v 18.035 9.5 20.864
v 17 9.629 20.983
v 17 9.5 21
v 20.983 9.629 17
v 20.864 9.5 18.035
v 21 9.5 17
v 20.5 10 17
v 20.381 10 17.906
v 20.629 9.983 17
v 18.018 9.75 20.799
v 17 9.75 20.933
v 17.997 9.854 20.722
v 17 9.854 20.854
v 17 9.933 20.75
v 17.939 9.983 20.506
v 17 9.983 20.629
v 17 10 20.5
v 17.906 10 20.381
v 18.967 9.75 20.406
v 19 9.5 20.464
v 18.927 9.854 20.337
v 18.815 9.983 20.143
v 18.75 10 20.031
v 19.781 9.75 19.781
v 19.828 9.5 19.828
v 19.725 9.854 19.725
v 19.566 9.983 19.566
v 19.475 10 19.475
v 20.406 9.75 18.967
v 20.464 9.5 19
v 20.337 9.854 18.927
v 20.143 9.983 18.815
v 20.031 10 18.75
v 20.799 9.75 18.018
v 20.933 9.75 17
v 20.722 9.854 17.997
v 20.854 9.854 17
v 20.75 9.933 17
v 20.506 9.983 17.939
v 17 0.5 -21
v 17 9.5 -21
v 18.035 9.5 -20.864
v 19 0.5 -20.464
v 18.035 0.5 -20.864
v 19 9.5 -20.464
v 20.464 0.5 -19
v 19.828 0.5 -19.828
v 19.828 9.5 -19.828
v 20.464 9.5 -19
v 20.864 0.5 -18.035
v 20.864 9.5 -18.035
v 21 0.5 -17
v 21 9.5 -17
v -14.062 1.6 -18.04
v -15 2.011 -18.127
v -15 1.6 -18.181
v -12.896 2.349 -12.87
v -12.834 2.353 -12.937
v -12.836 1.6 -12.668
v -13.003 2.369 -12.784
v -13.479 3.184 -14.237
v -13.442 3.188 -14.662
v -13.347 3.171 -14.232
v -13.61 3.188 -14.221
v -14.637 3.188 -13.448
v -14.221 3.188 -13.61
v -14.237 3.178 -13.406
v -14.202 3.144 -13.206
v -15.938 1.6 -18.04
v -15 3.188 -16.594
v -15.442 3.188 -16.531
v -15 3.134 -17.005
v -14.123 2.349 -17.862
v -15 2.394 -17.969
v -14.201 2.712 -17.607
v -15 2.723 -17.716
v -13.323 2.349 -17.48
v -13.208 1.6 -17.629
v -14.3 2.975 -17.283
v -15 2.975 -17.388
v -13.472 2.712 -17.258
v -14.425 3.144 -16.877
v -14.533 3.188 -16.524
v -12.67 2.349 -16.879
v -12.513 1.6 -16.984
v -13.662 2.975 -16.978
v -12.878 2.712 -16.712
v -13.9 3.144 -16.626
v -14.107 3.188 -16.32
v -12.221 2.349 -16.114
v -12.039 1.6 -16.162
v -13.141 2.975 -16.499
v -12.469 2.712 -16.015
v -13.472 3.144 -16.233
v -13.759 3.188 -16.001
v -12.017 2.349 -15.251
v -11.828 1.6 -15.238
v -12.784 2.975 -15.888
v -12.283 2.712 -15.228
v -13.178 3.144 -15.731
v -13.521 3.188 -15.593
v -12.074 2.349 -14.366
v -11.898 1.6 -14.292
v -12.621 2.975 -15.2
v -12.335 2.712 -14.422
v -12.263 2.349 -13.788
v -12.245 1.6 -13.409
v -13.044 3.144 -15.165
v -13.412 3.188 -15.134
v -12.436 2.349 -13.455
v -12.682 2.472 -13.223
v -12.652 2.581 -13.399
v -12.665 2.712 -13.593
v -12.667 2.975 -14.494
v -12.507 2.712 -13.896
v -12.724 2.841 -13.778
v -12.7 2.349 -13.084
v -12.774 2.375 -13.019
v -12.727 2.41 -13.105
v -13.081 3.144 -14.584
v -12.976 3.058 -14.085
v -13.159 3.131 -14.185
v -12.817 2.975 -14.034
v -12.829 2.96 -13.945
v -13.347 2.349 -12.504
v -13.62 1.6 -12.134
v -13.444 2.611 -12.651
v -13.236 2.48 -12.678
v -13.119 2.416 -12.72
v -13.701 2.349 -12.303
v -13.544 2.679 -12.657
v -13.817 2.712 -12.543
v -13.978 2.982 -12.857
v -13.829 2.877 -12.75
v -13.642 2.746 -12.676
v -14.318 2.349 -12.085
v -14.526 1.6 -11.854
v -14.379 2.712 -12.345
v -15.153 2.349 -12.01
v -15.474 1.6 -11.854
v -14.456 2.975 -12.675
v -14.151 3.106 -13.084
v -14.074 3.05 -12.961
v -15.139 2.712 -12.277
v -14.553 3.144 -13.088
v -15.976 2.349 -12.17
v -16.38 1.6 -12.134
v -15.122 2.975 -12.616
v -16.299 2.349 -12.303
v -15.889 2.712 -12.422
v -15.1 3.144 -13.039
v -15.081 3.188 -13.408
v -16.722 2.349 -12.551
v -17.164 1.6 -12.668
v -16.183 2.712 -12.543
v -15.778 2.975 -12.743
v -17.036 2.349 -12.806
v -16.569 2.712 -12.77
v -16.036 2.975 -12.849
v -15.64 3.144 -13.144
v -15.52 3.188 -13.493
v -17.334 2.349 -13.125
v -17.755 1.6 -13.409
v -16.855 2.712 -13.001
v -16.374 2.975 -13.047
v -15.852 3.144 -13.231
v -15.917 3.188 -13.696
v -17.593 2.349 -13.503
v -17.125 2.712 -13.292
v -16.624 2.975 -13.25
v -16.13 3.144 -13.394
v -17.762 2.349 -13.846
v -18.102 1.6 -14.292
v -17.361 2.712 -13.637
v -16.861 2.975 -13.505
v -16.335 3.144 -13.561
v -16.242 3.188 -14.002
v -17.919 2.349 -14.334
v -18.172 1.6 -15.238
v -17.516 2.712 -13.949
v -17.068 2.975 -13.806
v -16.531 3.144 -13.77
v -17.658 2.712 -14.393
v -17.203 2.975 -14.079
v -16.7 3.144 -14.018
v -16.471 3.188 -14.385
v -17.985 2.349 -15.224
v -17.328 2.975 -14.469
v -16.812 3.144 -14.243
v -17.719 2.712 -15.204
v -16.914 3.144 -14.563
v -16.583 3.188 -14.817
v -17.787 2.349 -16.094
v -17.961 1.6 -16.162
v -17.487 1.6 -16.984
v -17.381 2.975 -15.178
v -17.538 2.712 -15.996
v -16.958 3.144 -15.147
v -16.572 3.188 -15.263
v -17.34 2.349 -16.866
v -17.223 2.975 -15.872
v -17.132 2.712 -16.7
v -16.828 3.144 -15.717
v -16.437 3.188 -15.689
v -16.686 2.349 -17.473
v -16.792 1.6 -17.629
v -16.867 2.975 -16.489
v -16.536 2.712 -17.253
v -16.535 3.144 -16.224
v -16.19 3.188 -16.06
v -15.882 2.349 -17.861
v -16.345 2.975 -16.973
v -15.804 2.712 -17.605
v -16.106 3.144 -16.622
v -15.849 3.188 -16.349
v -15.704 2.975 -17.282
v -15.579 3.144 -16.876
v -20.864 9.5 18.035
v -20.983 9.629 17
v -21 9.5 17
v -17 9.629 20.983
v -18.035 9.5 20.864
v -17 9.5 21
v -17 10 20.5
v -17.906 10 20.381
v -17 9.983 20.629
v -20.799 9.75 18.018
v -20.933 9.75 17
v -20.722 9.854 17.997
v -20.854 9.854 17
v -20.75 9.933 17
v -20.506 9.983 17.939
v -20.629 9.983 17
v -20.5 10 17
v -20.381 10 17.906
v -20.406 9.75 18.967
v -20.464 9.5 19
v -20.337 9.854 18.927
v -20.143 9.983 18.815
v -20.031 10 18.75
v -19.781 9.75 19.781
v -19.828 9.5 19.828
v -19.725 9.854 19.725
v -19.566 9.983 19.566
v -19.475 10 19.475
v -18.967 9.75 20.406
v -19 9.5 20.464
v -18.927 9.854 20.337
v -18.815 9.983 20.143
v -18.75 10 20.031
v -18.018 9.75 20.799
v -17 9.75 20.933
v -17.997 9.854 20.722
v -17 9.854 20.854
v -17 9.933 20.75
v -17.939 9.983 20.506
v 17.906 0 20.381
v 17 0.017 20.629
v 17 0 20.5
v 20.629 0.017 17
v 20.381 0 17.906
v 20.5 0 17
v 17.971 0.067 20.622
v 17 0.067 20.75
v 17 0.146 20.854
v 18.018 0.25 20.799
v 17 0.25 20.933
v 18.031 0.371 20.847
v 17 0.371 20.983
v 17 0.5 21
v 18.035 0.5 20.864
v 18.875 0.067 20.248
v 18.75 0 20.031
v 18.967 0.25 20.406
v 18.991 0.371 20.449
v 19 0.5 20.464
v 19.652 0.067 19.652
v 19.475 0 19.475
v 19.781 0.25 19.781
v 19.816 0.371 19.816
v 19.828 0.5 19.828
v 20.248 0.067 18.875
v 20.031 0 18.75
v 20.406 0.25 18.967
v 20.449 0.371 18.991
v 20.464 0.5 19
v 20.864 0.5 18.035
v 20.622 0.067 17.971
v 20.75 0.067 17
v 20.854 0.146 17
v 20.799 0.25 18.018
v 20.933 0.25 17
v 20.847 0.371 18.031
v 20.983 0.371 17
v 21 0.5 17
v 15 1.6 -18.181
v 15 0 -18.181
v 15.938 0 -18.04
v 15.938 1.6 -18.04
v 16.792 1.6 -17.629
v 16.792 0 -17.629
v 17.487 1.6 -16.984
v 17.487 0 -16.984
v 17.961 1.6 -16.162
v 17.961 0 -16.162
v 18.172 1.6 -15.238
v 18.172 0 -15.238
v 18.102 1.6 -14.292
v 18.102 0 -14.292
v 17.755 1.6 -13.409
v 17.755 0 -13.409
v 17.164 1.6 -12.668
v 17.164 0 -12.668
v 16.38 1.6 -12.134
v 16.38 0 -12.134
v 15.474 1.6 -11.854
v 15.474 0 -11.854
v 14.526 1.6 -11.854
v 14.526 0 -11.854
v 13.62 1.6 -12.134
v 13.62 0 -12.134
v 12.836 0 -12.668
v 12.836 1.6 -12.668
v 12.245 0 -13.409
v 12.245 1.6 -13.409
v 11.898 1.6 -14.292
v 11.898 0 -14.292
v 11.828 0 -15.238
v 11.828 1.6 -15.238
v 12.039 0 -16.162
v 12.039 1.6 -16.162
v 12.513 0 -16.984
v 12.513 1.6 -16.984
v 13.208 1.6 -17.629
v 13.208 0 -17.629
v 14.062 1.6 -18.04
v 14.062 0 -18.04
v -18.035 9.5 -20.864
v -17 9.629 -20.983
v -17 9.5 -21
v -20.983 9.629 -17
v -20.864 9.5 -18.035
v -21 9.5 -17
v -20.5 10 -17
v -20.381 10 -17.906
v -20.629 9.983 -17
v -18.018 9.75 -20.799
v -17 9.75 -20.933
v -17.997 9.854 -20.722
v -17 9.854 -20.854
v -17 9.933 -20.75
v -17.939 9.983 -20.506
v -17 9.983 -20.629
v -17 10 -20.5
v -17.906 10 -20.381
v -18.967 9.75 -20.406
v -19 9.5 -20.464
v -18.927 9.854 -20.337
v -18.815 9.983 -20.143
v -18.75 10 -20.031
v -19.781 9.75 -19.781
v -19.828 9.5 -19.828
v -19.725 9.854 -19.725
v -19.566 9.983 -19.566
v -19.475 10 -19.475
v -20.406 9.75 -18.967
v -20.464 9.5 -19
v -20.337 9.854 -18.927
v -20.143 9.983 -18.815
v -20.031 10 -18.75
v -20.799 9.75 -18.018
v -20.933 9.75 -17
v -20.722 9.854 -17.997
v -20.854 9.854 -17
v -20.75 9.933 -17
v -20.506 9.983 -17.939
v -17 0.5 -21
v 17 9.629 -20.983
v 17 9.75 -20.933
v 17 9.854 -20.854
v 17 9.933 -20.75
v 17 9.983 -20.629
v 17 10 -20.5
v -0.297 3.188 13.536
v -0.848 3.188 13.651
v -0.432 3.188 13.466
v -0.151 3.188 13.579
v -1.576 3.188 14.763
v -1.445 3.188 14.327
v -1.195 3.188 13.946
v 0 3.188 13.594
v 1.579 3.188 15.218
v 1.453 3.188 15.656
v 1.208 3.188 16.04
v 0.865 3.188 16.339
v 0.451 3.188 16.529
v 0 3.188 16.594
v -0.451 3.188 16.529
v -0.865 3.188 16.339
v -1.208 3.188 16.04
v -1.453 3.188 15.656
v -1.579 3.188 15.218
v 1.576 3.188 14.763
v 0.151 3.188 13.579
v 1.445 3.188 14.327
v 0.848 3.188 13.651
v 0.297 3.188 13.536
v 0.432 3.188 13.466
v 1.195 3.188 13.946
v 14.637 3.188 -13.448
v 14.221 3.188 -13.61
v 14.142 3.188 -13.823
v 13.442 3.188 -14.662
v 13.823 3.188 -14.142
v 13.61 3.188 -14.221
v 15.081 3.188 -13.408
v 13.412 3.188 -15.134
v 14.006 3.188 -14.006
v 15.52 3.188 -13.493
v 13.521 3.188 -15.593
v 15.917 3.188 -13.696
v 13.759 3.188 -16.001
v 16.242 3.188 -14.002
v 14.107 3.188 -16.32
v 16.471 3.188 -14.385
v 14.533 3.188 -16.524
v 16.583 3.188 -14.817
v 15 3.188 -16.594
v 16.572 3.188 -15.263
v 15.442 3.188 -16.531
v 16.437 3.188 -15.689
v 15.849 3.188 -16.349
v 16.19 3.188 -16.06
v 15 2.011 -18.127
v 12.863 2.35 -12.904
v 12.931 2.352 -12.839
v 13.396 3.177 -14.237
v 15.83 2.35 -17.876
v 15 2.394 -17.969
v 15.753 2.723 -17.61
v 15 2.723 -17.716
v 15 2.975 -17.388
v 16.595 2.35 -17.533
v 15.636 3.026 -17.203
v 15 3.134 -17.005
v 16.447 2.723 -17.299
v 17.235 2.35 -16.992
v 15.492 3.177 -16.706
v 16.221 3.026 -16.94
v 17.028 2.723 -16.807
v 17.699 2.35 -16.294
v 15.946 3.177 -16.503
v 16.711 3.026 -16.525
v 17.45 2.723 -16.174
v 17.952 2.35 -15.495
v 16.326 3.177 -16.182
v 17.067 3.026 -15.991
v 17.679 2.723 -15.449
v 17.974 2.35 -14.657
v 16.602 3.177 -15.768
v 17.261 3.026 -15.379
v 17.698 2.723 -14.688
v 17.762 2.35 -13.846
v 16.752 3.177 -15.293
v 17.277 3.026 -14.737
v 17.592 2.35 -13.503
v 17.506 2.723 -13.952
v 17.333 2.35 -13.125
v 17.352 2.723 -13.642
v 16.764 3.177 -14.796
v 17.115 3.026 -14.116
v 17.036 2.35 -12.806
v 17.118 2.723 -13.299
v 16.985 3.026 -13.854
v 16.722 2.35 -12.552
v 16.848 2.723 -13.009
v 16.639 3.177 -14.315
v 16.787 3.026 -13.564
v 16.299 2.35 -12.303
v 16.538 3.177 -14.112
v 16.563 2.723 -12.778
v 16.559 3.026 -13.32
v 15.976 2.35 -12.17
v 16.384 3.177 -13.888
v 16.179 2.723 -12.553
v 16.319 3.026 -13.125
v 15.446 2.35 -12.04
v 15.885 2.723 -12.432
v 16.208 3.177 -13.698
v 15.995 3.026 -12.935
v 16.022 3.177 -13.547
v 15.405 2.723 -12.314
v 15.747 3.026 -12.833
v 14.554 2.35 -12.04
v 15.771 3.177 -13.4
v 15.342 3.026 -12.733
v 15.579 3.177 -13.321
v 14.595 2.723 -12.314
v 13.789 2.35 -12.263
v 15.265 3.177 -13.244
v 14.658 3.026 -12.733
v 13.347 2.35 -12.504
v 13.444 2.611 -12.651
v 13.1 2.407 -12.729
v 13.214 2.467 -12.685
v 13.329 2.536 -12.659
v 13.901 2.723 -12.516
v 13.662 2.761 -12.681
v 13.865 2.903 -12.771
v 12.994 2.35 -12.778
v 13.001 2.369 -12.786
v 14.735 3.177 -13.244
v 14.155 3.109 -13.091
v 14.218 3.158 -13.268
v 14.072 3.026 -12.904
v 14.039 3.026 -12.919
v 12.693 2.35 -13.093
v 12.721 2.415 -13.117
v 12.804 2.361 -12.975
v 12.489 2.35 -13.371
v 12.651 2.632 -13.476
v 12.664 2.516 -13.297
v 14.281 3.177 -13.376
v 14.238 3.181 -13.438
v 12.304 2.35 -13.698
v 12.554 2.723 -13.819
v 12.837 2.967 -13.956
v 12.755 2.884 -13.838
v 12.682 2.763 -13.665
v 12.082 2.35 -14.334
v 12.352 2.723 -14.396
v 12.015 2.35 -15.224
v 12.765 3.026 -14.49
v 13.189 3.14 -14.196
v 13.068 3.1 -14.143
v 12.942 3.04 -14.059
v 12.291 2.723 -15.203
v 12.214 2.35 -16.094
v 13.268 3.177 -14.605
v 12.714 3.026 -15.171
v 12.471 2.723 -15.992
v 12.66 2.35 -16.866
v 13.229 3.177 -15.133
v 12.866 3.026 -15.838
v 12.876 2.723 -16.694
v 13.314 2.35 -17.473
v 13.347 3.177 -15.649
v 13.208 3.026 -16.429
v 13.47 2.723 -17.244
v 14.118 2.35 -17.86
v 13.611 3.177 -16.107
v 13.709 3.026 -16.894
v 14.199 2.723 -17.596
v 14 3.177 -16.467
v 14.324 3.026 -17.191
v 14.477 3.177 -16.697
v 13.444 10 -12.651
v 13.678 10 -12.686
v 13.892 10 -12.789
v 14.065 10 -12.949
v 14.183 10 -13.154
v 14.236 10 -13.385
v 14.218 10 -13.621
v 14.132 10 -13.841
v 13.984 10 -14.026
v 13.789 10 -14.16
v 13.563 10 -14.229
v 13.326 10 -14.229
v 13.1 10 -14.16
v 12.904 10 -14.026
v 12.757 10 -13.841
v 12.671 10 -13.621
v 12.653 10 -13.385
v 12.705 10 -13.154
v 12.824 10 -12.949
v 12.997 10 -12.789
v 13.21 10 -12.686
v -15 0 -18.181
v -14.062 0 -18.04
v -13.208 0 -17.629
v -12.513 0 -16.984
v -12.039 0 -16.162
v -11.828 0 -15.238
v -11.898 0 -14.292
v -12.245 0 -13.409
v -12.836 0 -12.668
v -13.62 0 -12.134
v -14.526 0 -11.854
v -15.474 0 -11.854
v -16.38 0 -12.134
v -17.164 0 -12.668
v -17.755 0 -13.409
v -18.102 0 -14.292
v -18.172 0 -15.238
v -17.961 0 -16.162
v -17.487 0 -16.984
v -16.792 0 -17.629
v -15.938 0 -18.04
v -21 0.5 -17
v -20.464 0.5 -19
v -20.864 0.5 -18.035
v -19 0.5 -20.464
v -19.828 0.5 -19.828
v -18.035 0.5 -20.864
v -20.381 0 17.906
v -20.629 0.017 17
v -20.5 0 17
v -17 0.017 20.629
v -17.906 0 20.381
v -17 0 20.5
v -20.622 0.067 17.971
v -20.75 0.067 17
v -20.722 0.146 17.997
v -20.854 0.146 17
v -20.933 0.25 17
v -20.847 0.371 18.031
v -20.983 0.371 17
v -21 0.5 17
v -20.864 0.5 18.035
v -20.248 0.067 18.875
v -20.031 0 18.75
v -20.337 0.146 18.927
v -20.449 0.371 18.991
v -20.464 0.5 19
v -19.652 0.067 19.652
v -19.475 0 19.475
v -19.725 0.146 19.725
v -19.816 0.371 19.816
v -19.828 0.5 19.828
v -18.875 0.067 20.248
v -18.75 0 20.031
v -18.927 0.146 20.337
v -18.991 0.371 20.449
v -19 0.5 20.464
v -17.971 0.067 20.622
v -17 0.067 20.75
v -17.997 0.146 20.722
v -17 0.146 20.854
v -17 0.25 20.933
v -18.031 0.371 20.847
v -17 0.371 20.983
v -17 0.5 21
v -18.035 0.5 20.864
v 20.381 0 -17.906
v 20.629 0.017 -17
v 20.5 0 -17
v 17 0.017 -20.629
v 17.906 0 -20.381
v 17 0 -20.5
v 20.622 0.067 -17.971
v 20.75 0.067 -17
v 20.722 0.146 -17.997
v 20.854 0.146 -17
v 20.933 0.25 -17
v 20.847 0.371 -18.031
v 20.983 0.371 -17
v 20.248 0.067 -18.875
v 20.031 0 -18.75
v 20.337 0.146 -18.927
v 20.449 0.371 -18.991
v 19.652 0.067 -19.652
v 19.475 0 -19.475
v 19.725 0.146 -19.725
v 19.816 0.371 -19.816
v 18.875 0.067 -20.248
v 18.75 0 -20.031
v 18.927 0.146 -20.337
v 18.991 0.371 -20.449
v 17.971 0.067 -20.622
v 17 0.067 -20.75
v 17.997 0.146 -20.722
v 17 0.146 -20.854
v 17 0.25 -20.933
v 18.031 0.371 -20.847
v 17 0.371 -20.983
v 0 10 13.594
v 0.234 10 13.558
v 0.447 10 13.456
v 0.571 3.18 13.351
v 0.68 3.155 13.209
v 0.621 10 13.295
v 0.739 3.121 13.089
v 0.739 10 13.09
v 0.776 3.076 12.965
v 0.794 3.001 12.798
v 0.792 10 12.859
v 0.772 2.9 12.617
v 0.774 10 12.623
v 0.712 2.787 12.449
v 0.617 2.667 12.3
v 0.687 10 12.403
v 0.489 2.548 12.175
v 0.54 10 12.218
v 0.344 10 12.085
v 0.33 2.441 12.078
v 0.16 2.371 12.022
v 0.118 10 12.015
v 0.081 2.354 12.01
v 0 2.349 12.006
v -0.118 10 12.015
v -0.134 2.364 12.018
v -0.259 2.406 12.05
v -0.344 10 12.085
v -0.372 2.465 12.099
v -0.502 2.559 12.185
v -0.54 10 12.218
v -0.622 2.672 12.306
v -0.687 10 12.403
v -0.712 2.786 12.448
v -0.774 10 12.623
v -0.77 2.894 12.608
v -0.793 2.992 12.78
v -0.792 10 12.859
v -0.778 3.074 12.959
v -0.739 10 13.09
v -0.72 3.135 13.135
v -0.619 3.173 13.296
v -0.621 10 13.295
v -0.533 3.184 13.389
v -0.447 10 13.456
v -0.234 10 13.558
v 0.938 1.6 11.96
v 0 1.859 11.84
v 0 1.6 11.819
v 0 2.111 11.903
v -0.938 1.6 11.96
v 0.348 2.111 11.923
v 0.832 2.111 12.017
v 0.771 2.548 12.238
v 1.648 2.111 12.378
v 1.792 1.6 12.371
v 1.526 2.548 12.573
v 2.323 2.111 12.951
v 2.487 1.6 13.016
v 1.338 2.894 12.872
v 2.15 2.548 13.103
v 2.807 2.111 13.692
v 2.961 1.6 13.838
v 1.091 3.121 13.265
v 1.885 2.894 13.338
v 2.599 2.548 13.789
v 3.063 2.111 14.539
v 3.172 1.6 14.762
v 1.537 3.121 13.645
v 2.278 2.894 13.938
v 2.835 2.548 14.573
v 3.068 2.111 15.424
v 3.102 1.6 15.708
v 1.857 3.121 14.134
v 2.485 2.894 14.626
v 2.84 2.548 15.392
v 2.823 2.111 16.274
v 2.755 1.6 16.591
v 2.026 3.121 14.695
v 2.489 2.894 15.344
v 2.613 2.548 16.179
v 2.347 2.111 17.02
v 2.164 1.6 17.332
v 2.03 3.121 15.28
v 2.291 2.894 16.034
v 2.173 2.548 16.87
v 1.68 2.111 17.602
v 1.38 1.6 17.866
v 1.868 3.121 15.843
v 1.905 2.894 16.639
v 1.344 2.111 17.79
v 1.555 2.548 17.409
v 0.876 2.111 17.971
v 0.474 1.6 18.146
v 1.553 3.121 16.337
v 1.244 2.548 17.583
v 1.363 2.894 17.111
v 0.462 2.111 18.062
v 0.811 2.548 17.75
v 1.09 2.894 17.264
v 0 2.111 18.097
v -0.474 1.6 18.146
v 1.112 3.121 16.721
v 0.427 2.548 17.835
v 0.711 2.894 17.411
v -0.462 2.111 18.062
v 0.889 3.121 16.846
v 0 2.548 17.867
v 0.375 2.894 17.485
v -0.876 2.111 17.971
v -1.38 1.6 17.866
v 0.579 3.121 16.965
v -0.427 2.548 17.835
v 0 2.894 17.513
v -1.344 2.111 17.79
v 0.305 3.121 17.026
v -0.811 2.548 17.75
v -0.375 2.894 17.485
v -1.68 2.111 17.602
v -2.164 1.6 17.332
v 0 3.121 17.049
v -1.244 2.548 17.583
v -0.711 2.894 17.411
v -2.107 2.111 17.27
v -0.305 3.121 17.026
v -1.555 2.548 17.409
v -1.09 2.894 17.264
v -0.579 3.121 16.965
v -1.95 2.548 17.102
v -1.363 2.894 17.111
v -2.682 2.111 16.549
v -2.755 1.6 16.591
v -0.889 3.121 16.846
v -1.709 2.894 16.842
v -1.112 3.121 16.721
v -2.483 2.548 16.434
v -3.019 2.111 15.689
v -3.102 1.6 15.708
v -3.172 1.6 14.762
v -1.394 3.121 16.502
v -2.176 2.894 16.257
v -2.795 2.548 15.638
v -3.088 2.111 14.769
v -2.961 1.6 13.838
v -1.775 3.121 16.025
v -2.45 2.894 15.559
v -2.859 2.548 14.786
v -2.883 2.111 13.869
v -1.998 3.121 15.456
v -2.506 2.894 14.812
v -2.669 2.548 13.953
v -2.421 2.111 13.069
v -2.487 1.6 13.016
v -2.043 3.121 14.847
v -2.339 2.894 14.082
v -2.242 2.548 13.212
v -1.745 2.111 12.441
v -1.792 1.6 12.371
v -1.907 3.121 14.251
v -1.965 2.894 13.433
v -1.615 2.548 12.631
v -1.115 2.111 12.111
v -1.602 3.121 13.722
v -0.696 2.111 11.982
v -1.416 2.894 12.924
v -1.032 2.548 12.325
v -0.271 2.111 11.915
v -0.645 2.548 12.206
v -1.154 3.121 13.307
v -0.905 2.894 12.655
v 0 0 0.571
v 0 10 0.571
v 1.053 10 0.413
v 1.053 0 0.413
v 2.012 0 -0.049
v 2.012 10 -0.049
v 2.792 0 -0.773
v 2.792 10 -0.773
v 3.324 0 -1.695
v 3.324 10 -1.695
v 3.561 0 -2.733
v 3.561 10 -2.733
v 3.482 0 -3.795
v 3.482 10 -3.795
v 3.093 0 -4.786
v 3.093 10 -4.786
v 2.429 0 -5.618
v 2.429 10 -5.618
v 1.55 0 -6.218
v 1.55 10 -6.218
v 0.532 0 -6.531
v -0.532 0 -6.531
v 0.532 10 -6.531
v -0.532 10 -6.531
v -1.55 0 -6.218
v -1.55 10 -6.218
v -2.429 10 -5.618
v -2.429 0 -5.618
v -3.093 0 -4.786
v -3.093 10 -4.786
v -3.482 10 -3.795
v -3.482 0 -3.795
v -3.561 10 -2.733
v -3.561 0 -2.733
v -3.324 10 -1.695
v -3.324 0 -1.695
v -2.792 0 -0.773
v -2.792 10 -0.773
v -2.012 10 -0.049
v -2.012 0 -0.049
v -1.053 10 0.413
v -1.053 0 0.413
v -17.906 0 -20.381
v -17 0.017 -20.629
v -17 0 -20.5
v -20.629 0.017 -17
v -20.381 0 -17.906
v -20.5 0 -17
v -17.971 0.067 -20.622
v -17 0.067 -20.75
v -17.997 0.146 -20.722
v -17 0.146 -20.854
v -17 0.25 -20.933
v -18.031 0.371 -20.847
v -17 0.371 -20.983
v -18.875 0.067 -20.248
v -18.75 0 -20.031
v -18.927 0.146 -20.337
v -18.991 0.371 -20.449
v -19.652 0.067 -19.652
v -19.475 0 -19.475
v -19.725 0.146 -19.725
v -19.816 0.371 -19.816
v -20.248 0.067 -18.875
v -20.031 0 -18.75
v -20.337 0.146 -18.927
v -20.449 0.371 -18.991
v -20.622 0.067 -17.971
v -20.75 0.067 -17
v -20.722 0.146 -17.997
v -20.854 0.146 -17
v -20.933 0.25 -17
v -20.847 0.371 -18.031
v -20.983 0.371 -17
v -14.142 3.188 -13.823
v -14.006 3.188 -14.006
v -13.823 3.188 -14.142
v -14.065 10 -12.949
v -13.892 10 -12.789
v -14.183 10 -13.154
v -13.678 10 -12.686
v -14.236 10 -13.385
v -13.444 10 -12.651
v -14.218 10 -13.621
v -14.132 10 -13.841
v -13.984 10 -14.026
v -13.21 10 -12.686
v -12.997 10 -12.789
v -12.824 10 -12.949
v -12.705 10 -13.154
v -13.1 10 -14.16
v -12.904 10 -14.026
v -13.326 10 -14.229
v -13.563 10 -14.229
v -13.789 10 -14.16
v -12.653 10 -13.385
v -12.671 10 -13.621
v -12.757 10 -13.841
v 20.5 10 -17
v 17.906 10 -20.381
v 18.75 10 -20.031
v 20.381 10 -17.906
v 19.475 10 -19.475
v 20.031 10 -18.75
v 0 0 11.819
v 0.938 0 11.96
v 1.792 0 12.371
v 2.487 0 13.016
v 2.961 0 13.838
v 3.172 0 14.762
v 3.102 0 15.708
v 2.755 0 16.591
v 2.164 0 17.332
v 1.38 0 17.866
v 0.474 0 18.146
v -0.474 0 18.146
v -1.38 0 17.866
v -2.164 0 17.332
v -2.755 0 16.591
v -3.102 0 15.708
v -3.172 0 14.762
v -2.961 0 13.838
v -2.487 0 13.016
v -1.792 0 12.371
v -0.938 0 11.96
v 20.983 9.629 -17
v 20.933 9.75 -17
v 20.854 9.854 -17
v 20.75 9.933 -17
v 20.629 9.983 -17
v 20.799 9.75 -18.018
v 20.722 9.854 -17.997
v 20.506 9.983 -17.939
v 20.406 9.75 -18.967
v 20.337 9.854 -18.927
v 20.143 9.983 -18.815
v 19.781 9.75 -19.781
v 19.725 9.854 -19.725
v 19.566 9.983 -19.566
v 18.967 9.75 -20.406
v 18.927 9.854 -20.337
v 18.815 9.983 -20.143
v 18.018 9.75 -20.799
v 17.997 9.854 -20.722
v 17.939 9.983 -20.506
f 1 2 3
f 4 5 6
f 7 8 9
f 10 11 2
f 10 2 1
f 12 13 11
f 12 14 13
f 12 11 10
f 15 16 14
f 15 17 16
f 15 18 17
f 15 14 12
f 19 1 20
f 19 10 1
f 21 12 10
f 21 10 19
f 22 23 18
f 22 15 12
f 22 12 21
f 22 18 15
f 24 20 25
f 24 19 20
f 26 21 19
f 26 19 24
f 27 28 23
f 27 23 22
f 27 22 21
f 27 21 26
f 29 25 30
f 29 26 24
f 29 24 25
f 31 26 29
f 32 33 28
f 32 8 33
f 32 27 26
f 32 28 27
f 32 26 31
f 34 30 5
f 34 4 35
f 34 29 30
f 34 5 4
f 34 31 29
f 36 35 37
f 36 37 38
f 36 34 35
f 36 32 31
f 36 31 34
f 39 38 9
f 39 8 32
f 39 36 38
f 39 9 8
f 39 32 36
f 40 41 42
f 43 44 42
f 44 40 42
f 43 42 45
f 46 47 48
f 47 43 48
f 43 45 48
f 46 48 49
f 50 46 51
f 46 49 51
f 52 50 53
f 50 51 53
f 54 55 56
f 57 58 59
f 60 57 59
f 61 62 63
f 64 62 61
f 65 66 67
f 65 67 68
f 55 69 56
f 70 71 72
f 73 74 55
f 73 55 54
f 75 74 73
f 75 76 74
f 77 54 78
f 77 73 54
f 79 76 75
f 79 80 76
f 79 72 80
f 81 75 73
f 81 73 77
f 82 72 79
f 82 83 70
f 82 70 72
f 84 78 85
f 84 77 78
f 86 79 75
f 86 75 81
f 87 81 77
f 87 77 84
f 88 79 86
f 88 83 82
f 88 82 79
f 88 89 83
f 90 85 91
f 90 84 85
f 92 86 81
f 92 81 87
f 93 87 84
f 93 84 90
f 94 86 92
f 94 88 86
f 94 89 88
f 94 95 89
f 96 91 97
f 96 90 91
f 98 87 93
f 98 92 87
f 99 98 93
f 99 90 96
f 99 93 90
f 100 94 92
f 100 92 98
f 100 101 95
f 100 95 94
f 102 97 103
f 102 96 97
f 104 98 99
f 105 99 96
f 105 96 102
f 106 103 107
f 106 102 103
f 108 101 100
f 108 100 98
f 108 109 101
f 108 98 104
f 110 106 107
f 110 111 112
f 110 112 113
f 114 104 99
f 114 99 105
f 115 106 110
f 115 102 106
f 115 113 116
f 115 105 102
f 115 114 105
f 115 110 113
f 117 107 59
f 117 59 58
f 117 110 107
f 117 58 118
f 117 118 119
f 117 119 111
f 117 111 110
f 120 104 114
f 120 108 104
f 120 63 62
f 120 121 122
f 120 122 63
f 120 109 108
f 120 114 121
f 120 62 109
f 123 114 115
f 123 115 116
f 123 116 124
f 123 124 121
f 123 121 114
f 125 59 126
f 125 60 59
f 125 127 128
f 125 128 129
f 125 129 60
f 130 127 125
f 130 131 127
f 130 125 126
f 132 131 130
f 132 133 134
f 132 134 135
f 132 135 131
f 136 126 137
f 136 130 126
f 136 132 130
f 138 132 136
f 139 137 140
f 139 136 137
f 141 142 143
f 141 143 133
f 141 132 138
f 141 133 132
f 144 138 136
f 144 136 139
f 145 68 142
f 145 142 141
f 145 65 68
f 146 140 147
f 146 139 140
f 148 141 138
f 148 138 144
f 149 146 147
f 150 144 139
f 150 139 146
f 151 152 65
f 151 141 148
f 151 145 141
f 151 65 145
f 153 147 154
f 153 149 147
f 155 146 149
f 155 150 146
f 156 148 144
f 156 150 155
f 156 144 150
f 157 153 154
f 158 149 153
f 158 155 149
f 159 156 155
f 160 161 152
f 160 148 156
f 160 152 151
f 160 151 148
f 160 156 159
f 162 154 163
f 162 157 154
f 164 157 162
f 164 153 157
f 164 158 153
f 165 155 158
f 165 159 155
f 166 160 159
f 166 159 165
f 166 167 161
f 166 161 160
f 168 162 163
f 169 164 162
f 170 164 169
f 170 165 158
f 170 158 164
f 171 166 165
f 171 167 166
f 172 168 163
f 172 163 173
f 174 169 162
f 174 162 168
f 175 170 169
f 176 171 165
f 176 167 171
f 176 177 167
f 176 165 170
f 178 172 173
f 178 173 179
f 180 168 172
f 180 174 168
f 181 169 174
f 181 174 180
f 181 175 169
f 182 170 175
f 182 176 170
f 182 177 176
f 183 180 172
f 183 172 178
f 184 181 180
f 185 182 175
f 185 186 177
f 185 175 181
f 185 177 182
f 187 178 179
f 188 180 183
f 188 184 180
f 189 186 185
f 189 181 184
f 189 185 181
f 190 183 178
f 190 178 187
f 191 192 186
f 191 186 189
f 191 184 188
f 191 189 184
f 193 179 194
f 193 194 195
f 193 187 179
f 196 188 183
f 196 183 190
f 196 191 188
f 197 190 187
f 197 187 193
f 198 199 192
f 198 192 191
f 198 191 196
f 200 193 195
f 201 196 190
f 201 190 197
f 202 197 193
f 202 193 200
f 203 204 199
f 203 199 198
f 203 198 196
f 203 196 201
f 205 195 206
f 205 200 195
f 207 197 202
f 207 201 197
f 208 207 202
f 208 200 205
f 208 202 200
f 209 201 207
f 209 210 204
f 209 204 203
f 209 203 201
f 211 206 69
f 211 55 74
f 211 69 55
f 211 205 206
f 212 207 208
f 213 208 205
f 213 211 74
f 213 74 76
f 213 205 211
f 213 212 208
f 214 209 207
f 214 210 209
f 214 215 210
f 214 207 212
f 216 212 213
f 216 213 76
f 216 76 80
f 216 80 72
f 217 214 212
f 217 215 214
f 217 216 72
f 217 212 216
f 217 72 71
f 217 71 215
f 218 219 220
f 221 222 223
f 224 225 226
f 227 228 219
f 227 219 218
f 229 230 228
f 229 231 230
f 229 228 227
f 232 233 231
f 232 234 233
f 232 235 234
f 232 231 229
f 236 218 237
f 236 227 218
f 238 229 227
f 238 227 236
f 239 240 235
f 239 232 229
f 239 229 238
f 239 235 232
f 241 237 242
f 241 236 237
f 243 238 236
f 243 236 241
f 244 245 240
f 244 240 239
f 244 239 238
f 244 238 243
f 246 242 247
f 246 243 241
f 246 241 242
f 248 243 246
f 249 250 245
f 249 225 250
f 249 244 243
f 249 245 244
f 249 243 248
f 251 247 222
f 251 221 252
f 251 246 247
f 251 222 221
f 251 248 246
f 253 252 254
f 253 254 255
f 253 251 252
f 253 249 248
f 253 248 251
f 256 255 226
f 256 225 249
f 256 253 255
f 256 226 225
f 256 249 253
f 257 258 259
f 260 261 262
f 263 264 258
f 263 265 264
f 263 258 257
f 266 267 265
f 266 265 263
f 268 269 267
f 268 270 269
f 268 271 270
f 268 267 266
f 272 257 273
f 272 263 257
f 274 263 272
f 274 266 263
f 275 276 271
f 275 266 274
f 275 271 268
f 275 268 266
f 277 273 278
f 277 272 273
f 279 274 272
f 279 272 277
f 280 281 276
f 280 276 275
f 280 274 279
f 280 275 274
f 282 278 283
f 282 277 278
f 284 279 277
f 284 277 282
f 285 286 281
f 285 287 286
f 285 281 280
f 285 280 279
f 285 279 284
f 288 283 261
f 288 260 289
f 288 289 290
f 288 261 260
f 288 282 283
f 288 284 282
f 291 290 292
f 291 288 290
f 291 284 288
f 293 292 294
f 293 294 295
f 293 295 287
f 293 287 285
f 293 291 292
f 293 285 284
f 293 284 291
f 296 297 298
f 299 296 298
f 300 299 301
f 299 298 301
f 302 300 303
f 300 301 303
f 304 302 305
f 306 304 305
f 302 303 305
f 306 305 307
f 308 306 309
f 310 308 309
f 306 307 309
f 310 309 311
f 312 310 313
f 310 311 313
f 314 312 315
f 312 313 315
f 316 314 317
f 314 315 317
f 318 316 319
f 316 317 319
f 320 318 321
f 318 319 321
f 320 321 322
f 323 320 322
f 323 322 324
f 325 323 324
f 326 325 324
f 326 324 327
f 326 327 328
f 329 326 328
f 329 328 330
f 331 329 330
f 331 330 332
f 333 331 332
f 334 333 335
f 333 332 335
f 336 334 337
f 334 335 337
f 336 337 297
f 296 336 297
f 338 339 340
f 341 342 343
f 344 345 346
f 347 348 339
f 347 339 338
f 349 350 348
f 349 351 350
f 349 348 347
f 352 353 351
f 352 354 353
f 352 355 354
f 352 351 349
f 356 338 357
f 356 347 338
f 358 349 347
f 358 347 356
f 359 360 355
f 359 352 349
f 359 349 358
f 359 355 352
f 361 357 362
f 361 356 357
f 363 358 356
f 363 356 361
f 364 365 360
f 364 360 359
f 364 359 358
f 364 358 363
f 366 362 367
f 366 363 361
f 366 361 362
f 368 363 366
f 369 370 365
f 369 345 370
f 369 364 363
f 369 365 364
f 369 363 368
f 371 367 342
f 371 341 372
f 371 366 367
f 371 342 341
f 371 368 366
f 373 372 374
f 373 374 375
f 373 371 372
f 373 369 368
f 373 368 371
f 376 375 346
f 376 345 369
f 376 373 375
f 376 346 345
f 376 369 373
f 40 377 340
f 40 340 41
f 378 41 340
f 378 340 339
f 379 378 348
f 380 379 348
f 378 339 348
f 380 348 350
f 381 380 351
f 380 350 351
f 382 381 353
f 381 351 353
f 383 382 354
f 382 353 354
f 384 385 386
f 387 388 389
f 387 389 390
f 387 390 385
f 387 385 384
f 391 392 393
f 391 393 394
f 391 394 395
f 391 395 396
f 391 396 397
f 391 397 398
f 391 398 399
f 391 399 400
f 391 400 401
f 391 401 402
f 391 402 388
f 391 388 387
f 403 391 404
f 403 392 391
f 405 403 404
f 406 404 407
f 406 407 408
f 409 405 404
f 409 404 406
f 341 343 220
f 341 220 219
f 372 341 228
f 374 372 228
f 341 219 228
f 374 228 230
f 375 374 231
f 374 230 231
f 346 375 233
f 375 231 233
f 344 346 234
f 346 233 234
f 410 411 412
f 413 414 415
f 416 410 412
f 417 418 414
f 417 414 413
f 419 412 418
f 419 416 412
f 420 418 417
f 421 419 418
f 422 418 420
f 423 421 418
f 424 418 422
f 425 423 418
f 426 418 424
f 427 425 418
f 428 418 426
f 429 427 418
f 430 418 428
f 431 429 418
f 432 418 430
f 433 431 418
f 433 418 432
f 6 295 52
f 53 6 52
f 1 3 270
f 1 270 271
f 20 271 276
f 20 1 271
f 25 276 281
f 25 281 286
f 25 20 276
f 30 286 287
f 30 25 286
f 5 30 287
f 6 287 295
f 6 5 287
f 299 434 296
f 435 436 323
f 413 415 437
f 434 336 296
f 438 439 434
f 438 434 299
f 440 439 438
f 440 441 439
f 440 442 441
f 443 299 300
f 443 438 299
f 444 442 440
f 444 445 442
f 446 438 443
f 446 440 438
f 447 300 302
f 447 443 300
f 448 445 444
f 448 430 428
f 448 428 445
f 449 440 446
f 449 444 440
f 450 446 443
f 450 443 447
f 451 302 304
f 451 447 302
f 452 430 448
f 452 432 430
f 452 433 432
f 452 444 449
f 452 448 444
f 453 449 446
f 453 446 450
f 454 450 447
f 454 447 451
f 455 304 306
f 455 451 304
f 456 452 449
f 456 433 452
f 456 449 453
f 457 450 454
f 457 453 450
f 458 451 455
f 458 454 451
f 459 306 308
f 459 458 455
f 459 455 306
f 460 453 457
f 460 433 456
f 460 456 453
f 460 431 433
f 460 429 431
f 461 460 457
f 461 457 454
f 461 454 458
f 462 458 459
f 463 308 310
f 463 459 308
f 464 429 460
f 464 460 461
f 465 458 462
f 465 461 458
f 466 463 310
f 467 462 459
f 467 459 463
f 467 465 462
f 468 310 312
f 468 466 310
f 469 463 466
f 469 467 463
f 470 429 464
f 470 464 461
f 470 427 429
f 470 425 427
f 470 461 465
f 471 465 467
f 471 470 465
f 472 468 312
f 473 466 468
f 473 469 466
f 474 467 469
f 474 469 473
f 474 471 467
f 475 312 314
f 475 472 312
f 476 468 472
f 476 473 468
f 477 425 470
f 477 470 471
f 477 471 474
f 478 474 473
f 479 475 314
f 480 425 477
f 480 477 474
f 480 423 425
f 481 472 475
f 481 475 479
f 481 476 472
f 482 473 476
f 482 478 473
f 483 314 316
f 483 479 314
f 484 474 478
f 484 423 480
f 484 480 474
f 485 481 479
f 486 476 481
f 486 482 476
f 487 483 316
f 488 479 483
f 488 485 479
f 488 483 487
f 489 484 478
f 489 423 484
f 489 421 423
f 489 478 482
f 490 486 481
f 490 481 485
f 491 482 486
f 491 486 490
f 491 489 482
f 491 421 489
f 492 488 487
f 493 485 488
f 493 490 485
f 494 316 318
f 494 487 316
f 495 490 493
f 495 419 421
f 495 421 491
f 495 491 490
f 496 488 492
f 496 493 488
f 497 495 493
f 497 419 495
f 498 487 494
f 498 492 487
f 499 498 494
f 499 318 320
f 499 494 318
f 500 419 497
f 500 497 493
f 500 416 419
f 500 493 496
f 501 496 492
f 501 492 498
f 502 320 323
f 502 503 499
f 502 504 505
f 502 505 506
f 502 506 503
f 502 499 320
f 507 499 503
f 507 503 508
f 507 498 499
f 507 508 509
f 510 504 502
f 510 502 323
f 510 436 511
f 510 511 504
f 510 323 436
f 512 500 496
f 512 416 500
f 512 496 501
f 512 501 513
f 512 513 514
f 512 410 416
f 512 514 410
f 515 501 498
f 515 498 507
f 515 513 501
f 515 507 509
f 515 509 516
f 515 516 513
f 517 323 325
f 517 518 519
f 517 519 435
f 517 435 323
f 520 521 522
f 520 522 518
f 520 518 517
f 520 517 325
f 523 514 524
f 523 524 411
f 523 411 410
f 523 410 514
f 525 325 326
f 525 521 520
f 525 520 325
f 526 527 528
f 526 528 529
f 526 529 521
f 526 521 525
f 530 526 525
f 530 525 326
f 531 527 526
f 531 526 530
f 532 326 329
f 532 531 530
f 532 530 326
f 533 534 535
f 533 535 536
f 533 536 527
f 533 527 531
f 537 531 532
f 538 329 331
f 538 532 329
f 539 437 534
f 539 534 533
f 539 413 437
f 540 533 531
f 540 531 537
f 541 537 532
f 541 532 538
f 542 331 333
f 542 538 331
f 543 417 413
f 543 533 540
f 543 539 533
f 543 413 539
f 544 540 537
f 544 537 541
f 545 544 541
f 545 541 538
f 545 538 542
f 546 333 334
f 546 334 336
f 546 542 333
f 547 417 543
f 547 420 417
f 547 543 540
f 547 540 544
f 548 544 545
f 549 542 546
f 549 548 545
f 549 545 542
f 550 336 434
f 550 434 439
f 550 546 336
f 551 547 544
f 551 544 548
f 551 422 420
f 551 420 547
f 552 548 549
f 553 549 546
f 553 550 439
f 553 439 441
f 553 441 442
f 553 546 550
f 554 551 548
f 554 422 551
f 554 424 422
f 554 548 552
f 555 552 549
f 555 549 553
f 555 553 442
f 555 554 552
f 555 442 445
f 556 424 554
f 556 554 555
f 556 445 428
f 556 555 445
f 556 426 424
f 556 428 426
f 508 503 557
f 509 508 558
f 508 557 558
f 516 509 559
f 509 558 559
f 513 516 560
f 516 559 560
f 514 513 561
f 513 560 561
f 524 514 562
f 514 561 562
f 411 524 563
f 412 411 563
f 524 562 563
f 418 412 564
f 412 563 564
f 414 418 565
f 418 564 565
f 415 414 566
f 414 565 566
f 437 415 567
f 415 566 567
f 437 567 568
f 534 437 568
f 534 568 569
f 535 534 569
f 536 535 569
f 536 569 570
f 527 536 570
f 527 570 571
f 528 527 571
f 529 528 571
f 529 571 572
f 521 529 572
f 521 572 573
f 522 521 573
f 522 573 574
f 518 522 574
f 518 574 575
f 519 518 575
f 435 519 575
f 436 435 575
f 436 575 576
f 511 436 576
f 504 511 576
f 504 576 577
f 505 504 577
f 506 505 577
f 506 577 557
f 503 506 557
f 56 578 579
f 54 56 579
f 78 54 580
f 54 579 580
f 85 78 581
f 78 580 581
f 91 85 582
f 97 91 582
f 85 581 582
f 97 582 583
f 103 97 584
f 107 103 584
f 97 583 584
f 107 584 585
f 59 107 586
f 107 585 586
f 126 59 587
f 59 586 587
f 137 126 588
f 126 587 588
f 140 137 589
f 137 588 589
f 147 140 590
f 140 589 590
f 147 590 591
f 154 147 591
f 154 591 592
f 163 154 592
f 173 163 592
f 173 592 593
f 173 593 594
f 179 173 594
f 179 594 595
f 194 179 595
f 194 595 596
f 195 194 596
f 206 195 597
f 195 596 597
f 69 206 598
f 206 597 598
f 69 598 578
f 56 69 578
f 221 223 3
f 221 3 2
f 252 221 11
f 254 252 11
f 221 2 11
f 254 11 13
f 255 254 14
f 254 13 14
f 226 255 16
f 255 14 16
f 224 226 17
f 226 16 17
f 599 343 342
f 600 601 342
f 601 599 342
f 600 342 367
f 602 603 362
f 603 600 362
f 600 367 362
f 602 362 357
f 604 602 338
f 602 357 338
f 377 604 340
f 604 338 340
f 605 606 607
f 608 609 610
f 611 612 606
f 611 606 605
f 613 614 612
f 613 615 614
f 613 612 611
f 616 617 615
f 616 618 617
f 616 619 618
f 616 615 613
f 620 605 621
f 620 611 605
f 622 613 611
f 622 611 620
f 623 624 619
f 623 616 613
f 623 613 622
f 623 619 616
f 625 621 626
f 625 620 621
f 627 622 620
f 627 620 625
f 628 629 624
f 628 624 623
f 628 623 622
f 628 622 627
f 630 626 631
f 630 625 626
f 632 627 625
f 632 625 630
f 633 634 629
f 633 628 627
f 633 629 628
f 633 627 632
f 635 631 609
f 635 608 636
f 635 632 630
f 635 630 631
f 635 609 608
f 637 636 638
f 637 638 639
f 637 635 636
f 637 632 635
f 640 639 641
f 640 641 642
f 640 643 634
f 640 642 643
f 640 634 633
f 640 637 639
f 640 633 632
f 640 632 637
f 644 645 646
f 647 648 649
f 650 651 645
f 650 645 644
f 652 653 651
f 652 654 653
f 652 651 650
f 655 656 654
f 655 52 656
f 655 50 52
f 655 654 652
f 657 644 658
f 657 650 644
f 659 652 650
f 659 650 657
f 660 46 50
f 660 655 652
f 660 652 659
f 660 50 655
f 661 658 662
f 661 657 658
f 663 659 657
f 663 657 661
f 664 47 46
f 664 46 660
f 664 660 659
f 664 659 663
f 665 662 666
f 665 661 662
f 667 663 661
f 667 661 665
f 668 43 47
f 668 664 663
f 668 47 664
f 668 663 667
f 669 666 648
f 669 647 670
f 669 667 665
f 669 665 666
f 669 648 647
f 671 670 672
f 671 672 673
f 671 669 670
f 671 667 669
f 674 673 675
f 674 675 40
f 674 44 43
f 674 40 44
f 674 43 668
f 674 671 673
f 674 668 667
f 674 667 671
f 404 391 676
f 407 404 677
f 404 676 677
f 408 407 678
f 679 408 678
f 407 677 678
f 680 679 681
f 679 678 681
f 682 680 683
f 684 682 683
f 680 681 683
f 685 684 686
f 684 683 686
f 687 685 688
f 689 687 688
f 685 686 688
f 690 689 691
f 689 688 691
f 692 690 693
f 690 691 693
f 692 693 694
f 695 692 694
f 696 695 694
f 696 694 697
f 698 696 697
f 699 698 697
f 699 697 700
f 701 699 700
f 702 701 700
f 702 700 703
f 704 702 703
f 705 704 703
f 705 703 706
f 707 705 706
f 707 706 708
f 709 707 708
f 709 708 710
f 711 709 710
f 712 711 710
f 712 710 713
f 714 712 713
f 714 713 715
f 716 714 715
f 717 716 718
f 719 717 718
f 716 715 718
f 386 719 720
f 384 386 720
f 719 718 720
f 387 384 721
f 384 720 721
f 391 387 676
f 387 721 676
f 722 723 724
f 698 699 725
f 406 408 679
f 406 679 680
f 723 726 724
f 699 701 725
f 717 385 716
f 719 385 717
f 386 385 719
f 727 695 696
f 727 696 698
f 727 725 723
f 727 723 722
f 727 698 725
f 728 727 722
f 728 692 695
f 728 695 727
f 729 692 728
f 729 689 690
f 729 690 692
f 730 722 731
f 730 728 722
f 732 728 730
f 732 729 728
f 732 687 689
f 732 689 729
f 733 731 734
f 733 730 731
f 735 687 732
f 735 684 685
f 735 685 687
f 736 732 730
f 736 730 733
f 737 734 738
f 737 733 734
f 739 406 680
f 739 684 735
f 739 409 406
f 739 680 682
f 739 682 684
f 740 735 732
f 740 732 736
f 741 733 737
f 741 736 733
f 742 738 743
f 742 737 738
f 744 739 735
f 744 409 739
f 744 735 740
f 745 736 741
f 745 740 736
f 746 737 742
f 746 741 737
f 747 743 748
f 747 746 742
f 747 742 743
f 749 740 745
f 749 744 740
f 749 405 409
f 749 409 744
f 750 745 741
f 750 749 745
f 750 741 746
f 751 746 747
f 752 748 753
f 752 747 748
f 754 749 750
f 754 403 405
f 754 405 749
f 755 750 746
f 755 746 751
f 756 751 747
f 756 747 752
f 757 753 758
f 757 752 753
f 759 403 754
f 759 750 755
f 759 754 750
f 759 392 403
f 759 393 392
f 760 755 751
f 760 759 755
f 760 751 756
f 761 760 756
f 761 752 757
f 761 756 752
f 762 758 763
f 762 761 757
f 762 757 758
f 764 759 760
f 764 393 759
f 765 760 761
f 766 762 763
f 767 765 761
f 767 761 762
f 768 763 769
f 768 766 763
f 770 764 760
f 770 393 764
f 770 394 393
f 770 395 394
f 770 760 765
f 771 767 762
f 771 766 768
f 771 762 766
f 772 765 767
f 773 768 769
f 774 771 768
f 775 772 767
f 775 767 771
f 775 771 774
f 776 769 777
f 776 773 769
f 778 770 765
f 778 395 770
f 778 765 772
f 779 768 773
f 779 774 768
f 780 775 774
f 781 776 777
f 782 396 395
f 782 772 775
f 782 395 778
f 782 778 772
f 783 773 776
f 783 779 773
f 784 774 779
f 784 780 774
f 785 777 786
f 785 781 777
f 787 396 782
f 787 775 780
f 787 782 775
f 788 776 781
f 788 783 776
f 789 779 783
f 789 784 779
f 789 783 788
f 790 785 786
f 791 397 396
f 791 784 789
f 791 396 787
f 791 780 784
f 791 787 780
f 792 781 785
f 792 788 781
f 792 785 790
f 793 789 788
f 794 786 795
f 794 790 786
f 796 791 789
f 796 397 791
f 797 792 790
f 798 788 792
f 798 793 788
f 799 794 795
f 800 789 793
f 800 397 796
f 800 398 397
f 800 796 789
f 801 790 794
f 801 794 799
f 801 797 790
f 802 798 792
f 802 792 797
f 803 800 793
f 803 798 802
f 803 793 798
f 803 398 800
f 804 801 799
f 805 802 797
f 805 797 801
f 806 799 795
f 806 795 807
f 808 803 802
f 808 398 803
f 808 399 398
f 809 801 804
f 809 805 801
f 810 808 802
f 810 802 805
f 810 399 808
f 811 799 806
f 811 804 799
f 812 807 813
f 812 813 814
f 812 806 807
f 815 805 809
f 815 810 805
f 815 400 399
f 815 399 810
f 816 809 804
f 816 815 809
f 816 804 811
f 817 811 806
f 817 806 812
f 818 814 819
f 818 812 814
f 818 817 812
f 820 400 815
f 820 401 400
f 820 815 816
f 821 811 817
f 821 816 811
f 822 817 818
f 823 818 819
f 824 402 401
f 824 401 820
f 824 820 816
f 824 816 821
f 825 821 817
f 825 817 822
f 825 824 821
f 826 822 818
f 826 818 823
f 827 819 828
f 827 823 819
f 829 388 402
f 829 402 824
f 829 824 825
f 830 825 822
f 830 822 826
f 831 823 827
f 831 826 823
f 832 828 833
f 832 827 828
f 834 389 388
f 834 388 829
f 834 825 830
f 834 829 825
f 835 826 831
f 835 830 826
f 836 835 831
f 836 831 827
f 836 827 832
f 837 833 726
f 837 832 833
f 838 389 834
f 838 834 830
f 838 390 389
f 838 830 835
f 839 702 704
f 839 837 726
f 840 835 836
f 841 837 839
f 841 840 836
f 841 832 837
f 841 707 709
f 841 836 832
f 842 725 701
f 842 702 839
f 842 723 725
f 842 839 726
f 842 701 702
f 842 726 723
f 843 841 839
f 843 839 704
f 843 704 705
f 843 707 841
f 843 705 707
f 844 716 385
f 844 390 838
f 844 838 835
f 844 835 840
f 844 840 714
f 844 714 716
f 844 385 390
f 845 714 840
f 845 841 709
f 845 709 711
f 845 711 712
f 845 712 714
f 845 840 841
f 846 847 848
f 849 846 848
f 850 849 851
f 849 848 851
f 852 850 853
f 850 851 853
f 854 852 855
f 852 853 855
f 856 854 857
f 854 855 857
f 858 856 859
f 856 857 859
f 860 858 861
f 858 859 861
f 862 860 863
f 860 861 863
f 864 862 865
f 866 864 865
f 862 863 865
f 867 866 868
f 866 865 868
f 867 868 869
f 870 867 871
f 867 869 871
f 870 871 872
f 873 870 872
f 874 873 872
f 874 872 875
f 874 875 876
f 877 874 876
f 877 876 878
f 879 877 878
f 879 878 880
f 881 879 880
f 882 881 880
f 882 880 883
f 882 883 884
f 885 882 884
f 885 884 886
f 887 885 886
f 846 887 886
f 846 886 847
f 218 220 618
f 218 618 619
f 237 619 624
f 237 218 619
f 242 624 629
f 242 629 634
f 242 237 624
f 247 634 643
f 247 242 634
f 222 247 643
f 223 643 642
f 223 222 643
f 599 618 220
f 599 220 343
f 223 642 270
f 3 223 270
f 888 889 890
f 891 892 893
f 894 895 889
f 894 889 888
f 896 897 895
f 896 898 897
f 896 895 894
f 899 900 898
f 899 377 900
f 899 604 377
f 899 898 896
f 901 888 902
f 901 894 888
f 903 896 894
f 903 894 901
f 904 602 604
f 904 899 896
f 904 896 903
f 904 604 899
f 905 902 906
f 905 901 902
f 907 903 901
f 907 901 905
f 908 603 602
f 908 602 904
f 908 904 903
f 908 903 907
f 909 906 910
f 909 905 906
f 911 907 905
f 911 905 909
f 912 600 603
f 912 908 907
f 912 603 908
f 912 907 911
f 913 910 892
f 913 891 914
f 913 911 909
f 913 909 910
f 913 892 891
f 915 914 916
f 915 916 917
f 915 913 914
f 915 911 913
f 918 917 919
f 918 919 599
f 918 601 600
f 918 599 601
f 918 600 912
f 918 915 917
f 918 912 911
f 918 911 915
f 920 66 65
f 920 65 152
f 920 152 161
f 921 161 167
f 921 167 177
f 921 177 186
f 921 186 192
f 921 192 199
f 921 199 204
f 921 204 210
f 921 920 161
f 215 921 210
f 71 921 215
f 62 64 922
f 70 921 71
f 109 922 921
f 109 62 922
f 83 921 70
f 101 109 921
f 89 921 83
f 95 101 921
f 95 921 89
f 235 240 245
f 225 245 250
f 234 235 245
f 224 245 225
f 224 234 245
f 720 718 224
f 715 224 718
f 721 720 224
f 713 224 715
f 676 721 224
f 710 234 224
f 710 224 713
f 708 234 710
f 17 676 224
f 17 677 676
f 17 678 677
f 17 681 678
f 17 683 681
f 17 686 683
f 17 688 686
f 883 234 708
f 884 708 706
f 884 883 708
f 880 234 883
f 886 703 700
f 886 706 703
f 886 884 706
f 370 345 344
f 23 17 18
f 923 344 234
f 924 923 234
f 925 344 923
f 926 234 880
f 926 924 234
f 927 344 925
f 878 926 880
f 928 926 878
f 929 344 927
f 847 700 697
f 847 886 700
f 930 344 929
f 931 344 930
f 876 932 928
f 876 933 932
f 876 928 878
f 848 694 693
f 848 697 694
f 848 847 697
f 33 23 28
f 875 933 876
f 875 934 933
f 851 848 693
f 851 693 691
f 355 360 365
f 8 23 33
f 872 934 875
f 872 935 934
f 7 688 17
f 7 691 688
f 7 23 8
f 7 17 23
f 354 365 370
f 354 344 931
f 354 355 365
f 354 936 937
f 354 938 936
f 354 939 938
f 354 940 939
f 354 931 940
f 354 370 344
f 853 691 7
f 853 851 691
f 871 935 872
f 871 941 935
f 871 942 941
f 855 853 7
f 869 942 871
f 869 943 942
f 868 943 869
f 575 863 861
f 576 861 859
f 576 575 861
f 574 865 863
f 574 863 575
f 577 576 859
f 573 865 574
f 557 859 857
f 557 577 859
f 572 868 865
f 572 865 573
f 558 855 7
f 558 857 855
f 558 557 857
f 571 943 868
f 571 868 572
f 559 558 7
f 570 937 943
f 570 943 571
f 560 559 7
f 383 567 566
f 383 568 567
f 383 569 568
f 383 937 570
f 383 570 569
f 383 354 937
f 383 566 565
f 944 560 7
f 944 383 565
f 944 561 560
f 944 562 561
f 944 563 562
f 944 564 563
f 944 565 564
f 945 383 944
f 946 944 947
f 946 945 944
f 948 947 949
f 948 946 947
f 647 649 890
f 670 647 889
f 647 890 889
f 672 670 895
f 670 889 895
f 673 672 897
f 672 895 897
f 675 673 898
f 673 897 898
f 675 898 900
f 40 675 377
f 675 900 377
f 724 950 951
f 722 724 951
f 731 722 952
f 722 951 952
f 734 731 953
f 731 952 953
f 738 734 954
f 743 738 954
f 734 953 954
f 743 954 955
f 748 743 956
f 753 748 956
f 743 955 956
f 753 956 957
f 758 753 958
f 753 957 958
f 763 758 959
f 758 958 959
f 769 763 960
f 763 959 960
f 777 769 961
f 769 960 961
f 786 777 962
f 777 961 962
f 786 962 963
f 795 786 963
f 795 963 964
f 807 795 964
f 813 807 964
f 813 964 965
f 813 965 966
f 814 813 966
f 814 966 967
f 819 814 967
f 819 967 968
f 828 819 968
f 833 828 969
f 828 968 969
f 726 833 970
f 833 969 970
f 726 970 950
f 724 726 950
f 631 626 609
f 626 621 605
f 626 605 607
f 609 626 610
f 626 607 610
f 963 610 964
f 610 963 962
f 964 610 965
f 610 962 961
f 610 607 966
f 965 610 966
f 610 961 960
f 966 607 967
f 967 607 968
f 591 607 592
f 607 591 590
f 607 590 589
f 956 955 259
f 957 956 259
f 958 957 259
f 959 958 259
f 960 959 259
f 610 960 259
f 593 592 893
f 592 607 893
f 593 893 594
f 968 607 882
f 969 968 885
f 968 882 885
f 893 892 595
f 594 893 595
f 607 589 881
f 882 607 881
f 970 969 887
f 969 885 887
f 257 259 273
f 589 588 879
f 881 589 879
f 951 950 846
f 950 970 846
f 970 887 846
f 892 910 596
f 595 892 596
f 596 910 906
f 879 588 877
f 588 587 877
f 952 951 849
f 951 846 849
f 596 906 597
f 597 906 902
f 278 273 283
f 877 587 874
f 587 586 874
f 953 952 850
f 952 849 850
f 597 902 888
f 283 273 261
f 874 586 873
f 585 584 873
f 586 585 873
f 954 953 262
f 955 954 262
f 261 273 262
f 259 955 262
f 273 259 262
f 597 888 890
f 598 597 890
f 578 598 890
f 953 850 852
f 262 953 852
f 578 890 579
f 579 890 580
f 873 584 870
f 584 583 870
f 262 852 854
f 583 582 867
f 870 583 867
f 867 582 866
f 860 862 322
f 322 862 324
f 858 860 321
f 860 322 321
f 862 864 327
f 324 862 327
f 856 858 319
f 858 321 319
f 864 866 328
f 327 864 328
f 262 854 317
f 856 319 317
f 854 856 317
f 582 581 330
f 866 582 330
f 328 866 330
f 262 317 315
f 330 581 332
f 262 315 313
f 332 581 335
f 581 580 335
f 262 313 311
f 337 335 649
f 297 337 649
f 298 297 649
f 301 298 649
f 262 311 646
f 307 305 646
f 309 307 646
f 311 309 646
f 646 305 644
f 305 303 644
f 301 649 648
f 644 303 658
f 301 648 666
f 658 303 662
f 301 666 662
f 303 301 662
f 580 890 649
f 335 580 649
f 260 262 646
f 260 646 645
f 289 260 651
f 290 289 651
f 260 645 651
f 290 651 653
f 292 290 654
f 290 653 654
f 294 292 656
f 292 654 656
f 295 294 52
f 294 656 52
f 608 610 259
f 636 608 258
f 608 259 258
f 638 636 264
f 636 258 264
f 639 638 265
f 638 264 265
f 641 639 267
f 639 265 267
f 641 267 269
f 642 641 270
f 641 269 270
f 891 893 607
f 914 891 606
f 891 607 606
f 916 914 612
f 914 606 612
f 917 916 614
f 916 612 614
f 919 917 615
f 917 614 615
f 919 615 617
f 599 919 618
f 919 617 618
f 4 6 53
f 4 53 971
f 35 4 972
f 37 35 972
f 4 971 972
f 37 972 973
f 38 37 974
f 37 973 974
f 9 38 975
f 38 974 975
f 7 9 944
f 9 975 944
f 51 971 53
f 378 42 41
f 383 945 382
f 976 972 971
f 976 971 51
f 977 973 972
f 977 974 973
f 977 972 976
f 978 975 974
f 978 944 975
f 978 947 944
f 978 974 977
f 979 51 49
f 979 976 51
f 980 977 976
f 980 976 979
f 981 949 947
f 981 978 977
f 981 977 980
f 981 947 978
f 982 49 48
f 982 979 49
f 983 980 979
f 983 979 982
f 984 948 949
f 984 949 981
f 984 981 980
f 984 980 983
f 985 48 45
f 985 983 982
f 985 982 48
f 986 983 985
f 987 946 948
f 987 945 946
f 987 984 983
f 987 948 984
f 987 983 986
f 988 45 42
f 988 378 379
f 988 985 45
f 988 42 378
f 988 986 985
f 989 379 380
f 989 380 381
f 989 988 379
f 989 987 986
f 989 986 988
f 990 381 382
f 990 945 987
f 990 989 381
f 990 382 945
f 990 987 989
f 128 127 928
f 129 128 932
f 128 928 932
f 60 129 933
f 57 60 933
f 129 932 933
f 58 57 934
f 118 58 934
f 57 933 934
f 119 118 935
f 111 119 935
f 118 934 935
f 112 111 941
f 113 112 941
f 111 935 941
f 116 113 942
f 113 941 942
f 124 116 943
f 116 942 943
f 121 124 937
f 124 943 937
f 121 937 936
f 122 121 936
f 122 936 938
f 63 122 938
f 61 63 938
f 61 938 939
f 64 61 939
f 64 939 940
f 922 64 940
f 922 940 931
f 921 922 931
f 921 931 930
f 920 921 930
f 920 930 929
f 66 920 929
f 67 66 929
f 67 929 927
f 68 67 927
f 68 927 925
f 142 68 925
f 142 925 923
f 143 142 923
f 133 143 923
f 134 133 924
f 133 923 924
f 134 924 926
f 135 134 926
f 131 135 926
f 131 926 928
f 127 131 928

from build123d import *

# Parameters (mm, degrees)
SKETCH1_W                      = 42
SKETCH1_H                      = 42
EXTRUDE1_DEPTH                 = 10
SKETCH2_R                      = 3.18135
EXTRUDE2_DEPTH                 = 3.1877
F_1_4_CLEARANCE_HOLE1_D        = 7.14248
FILLET1_R                      = 4
FILLET2_R                      = 1.5875
F_1_16_0_0625_DIAMETER_HOLE1_D = 1.5875
FILLET3_R                      = 0.5


with BuildPart() as part:
    # Sketch1 → Extrude1 (new body)
    with BuildSketch(Plane(origin=(0, 0, 0), x_dir=(1, 0, 0), z_dir=(0, 1, 0))):
        Rectangle(SKETCH1_W, SKETCH1_H)
    extrude(amount=EXTRUDE1_DEPTH)

    # Sketch2 → Extrude2 (cut)
    with BuildSketch(Plane.XZ):
        with Locations(Location((-15, -15, 0), (0, 0, 270))):  # turned: the seam where the file's is
            Circle(SKETCH2_R)
        with Locations(Location((15, -15, 0), (0, 0, 270))):  # turned: the seam where the file's is
            Circle(SKETCH2_R)
        with Locations(Location((0, 15, 0), (0, 0, 270))):  # turned: the seam where the file's is
            Circle(SKETCH2_R)
    extrude(amount=-EXTRUDE2_DEPTH, mode=Mode.SUBTRACT)

    # 1/4 Clearance Hole1 (through all)
    with Locations(Plane(origin=(0, 0, -3), x_dir=(0, 0, -1), z_dir=(0, -1, 0))):
        with Locations((0, 0)):
            Hole(F_1_4_CLEARANCE_HOLE1_D / 2)

    # Fillet1
    fillet1_edges = [part.edges().sort_by_distance(p)[0] for p in [
        (-21, 5, -21),
        (21, 5, -21),
        (21, 5, 21),
        (-21, 5, 21),
    ]]
    fillet(fillet1_edges, radius=FILLET1_R)

    # Fillet2
    fillet2_edges = [part.edges().sort_by_distance(p)[0] for p in [
        (-15, 3.1877, -11.81865),
        (15, 3.1877, -11.81865),
        (0, 3.1877, 18.18135),
    ]]
    fillet(fillet2_edges, radius=FILLET2_R)

    # 1/16 (0.0625) Diameter Hole1 (through all)
    with Locations(Plane(origin=(0, 0, 12.8), x_dir=(0, 0, -1), z_dir=(0, -1, 0))):
        with Locations((0, 0), (26.244365081, -13.444365081), (26.244365081, 13.444365081)):
            Hole(F_1_16_0_0625_DIAMETER_HOLE1_D / 2)

    # Fillet3
    fillet3_edges = [part.edges().sort_by_distance(p)[0] for p in [
        (21, 0, 0),
        (21, 10, 0),
        (-21, 0, 0),
        (0, 0, -21),
        (0, 0, 21),
        (19.828427125, 0, -19.828427125),
        (-19.828427125, 0, -19.828427125),
        (-19.828427125, 0, 19.828427125),
        (19.828427125, 0, 19.828427125),
        (0, 10, 21),
        (-21, 10, 0),
        (0, 10, -21),
        (19.828427125, 10, -19.828427125),
        (-19.828427125, 10, -19.828427125),
        (-19.828427125, 10, 19.828427125),
        (19.828427125, 10, 19.828427125),
    ]]
    fillet(fillet3_edges, radius=FILLET3_R)


solid = part.part
